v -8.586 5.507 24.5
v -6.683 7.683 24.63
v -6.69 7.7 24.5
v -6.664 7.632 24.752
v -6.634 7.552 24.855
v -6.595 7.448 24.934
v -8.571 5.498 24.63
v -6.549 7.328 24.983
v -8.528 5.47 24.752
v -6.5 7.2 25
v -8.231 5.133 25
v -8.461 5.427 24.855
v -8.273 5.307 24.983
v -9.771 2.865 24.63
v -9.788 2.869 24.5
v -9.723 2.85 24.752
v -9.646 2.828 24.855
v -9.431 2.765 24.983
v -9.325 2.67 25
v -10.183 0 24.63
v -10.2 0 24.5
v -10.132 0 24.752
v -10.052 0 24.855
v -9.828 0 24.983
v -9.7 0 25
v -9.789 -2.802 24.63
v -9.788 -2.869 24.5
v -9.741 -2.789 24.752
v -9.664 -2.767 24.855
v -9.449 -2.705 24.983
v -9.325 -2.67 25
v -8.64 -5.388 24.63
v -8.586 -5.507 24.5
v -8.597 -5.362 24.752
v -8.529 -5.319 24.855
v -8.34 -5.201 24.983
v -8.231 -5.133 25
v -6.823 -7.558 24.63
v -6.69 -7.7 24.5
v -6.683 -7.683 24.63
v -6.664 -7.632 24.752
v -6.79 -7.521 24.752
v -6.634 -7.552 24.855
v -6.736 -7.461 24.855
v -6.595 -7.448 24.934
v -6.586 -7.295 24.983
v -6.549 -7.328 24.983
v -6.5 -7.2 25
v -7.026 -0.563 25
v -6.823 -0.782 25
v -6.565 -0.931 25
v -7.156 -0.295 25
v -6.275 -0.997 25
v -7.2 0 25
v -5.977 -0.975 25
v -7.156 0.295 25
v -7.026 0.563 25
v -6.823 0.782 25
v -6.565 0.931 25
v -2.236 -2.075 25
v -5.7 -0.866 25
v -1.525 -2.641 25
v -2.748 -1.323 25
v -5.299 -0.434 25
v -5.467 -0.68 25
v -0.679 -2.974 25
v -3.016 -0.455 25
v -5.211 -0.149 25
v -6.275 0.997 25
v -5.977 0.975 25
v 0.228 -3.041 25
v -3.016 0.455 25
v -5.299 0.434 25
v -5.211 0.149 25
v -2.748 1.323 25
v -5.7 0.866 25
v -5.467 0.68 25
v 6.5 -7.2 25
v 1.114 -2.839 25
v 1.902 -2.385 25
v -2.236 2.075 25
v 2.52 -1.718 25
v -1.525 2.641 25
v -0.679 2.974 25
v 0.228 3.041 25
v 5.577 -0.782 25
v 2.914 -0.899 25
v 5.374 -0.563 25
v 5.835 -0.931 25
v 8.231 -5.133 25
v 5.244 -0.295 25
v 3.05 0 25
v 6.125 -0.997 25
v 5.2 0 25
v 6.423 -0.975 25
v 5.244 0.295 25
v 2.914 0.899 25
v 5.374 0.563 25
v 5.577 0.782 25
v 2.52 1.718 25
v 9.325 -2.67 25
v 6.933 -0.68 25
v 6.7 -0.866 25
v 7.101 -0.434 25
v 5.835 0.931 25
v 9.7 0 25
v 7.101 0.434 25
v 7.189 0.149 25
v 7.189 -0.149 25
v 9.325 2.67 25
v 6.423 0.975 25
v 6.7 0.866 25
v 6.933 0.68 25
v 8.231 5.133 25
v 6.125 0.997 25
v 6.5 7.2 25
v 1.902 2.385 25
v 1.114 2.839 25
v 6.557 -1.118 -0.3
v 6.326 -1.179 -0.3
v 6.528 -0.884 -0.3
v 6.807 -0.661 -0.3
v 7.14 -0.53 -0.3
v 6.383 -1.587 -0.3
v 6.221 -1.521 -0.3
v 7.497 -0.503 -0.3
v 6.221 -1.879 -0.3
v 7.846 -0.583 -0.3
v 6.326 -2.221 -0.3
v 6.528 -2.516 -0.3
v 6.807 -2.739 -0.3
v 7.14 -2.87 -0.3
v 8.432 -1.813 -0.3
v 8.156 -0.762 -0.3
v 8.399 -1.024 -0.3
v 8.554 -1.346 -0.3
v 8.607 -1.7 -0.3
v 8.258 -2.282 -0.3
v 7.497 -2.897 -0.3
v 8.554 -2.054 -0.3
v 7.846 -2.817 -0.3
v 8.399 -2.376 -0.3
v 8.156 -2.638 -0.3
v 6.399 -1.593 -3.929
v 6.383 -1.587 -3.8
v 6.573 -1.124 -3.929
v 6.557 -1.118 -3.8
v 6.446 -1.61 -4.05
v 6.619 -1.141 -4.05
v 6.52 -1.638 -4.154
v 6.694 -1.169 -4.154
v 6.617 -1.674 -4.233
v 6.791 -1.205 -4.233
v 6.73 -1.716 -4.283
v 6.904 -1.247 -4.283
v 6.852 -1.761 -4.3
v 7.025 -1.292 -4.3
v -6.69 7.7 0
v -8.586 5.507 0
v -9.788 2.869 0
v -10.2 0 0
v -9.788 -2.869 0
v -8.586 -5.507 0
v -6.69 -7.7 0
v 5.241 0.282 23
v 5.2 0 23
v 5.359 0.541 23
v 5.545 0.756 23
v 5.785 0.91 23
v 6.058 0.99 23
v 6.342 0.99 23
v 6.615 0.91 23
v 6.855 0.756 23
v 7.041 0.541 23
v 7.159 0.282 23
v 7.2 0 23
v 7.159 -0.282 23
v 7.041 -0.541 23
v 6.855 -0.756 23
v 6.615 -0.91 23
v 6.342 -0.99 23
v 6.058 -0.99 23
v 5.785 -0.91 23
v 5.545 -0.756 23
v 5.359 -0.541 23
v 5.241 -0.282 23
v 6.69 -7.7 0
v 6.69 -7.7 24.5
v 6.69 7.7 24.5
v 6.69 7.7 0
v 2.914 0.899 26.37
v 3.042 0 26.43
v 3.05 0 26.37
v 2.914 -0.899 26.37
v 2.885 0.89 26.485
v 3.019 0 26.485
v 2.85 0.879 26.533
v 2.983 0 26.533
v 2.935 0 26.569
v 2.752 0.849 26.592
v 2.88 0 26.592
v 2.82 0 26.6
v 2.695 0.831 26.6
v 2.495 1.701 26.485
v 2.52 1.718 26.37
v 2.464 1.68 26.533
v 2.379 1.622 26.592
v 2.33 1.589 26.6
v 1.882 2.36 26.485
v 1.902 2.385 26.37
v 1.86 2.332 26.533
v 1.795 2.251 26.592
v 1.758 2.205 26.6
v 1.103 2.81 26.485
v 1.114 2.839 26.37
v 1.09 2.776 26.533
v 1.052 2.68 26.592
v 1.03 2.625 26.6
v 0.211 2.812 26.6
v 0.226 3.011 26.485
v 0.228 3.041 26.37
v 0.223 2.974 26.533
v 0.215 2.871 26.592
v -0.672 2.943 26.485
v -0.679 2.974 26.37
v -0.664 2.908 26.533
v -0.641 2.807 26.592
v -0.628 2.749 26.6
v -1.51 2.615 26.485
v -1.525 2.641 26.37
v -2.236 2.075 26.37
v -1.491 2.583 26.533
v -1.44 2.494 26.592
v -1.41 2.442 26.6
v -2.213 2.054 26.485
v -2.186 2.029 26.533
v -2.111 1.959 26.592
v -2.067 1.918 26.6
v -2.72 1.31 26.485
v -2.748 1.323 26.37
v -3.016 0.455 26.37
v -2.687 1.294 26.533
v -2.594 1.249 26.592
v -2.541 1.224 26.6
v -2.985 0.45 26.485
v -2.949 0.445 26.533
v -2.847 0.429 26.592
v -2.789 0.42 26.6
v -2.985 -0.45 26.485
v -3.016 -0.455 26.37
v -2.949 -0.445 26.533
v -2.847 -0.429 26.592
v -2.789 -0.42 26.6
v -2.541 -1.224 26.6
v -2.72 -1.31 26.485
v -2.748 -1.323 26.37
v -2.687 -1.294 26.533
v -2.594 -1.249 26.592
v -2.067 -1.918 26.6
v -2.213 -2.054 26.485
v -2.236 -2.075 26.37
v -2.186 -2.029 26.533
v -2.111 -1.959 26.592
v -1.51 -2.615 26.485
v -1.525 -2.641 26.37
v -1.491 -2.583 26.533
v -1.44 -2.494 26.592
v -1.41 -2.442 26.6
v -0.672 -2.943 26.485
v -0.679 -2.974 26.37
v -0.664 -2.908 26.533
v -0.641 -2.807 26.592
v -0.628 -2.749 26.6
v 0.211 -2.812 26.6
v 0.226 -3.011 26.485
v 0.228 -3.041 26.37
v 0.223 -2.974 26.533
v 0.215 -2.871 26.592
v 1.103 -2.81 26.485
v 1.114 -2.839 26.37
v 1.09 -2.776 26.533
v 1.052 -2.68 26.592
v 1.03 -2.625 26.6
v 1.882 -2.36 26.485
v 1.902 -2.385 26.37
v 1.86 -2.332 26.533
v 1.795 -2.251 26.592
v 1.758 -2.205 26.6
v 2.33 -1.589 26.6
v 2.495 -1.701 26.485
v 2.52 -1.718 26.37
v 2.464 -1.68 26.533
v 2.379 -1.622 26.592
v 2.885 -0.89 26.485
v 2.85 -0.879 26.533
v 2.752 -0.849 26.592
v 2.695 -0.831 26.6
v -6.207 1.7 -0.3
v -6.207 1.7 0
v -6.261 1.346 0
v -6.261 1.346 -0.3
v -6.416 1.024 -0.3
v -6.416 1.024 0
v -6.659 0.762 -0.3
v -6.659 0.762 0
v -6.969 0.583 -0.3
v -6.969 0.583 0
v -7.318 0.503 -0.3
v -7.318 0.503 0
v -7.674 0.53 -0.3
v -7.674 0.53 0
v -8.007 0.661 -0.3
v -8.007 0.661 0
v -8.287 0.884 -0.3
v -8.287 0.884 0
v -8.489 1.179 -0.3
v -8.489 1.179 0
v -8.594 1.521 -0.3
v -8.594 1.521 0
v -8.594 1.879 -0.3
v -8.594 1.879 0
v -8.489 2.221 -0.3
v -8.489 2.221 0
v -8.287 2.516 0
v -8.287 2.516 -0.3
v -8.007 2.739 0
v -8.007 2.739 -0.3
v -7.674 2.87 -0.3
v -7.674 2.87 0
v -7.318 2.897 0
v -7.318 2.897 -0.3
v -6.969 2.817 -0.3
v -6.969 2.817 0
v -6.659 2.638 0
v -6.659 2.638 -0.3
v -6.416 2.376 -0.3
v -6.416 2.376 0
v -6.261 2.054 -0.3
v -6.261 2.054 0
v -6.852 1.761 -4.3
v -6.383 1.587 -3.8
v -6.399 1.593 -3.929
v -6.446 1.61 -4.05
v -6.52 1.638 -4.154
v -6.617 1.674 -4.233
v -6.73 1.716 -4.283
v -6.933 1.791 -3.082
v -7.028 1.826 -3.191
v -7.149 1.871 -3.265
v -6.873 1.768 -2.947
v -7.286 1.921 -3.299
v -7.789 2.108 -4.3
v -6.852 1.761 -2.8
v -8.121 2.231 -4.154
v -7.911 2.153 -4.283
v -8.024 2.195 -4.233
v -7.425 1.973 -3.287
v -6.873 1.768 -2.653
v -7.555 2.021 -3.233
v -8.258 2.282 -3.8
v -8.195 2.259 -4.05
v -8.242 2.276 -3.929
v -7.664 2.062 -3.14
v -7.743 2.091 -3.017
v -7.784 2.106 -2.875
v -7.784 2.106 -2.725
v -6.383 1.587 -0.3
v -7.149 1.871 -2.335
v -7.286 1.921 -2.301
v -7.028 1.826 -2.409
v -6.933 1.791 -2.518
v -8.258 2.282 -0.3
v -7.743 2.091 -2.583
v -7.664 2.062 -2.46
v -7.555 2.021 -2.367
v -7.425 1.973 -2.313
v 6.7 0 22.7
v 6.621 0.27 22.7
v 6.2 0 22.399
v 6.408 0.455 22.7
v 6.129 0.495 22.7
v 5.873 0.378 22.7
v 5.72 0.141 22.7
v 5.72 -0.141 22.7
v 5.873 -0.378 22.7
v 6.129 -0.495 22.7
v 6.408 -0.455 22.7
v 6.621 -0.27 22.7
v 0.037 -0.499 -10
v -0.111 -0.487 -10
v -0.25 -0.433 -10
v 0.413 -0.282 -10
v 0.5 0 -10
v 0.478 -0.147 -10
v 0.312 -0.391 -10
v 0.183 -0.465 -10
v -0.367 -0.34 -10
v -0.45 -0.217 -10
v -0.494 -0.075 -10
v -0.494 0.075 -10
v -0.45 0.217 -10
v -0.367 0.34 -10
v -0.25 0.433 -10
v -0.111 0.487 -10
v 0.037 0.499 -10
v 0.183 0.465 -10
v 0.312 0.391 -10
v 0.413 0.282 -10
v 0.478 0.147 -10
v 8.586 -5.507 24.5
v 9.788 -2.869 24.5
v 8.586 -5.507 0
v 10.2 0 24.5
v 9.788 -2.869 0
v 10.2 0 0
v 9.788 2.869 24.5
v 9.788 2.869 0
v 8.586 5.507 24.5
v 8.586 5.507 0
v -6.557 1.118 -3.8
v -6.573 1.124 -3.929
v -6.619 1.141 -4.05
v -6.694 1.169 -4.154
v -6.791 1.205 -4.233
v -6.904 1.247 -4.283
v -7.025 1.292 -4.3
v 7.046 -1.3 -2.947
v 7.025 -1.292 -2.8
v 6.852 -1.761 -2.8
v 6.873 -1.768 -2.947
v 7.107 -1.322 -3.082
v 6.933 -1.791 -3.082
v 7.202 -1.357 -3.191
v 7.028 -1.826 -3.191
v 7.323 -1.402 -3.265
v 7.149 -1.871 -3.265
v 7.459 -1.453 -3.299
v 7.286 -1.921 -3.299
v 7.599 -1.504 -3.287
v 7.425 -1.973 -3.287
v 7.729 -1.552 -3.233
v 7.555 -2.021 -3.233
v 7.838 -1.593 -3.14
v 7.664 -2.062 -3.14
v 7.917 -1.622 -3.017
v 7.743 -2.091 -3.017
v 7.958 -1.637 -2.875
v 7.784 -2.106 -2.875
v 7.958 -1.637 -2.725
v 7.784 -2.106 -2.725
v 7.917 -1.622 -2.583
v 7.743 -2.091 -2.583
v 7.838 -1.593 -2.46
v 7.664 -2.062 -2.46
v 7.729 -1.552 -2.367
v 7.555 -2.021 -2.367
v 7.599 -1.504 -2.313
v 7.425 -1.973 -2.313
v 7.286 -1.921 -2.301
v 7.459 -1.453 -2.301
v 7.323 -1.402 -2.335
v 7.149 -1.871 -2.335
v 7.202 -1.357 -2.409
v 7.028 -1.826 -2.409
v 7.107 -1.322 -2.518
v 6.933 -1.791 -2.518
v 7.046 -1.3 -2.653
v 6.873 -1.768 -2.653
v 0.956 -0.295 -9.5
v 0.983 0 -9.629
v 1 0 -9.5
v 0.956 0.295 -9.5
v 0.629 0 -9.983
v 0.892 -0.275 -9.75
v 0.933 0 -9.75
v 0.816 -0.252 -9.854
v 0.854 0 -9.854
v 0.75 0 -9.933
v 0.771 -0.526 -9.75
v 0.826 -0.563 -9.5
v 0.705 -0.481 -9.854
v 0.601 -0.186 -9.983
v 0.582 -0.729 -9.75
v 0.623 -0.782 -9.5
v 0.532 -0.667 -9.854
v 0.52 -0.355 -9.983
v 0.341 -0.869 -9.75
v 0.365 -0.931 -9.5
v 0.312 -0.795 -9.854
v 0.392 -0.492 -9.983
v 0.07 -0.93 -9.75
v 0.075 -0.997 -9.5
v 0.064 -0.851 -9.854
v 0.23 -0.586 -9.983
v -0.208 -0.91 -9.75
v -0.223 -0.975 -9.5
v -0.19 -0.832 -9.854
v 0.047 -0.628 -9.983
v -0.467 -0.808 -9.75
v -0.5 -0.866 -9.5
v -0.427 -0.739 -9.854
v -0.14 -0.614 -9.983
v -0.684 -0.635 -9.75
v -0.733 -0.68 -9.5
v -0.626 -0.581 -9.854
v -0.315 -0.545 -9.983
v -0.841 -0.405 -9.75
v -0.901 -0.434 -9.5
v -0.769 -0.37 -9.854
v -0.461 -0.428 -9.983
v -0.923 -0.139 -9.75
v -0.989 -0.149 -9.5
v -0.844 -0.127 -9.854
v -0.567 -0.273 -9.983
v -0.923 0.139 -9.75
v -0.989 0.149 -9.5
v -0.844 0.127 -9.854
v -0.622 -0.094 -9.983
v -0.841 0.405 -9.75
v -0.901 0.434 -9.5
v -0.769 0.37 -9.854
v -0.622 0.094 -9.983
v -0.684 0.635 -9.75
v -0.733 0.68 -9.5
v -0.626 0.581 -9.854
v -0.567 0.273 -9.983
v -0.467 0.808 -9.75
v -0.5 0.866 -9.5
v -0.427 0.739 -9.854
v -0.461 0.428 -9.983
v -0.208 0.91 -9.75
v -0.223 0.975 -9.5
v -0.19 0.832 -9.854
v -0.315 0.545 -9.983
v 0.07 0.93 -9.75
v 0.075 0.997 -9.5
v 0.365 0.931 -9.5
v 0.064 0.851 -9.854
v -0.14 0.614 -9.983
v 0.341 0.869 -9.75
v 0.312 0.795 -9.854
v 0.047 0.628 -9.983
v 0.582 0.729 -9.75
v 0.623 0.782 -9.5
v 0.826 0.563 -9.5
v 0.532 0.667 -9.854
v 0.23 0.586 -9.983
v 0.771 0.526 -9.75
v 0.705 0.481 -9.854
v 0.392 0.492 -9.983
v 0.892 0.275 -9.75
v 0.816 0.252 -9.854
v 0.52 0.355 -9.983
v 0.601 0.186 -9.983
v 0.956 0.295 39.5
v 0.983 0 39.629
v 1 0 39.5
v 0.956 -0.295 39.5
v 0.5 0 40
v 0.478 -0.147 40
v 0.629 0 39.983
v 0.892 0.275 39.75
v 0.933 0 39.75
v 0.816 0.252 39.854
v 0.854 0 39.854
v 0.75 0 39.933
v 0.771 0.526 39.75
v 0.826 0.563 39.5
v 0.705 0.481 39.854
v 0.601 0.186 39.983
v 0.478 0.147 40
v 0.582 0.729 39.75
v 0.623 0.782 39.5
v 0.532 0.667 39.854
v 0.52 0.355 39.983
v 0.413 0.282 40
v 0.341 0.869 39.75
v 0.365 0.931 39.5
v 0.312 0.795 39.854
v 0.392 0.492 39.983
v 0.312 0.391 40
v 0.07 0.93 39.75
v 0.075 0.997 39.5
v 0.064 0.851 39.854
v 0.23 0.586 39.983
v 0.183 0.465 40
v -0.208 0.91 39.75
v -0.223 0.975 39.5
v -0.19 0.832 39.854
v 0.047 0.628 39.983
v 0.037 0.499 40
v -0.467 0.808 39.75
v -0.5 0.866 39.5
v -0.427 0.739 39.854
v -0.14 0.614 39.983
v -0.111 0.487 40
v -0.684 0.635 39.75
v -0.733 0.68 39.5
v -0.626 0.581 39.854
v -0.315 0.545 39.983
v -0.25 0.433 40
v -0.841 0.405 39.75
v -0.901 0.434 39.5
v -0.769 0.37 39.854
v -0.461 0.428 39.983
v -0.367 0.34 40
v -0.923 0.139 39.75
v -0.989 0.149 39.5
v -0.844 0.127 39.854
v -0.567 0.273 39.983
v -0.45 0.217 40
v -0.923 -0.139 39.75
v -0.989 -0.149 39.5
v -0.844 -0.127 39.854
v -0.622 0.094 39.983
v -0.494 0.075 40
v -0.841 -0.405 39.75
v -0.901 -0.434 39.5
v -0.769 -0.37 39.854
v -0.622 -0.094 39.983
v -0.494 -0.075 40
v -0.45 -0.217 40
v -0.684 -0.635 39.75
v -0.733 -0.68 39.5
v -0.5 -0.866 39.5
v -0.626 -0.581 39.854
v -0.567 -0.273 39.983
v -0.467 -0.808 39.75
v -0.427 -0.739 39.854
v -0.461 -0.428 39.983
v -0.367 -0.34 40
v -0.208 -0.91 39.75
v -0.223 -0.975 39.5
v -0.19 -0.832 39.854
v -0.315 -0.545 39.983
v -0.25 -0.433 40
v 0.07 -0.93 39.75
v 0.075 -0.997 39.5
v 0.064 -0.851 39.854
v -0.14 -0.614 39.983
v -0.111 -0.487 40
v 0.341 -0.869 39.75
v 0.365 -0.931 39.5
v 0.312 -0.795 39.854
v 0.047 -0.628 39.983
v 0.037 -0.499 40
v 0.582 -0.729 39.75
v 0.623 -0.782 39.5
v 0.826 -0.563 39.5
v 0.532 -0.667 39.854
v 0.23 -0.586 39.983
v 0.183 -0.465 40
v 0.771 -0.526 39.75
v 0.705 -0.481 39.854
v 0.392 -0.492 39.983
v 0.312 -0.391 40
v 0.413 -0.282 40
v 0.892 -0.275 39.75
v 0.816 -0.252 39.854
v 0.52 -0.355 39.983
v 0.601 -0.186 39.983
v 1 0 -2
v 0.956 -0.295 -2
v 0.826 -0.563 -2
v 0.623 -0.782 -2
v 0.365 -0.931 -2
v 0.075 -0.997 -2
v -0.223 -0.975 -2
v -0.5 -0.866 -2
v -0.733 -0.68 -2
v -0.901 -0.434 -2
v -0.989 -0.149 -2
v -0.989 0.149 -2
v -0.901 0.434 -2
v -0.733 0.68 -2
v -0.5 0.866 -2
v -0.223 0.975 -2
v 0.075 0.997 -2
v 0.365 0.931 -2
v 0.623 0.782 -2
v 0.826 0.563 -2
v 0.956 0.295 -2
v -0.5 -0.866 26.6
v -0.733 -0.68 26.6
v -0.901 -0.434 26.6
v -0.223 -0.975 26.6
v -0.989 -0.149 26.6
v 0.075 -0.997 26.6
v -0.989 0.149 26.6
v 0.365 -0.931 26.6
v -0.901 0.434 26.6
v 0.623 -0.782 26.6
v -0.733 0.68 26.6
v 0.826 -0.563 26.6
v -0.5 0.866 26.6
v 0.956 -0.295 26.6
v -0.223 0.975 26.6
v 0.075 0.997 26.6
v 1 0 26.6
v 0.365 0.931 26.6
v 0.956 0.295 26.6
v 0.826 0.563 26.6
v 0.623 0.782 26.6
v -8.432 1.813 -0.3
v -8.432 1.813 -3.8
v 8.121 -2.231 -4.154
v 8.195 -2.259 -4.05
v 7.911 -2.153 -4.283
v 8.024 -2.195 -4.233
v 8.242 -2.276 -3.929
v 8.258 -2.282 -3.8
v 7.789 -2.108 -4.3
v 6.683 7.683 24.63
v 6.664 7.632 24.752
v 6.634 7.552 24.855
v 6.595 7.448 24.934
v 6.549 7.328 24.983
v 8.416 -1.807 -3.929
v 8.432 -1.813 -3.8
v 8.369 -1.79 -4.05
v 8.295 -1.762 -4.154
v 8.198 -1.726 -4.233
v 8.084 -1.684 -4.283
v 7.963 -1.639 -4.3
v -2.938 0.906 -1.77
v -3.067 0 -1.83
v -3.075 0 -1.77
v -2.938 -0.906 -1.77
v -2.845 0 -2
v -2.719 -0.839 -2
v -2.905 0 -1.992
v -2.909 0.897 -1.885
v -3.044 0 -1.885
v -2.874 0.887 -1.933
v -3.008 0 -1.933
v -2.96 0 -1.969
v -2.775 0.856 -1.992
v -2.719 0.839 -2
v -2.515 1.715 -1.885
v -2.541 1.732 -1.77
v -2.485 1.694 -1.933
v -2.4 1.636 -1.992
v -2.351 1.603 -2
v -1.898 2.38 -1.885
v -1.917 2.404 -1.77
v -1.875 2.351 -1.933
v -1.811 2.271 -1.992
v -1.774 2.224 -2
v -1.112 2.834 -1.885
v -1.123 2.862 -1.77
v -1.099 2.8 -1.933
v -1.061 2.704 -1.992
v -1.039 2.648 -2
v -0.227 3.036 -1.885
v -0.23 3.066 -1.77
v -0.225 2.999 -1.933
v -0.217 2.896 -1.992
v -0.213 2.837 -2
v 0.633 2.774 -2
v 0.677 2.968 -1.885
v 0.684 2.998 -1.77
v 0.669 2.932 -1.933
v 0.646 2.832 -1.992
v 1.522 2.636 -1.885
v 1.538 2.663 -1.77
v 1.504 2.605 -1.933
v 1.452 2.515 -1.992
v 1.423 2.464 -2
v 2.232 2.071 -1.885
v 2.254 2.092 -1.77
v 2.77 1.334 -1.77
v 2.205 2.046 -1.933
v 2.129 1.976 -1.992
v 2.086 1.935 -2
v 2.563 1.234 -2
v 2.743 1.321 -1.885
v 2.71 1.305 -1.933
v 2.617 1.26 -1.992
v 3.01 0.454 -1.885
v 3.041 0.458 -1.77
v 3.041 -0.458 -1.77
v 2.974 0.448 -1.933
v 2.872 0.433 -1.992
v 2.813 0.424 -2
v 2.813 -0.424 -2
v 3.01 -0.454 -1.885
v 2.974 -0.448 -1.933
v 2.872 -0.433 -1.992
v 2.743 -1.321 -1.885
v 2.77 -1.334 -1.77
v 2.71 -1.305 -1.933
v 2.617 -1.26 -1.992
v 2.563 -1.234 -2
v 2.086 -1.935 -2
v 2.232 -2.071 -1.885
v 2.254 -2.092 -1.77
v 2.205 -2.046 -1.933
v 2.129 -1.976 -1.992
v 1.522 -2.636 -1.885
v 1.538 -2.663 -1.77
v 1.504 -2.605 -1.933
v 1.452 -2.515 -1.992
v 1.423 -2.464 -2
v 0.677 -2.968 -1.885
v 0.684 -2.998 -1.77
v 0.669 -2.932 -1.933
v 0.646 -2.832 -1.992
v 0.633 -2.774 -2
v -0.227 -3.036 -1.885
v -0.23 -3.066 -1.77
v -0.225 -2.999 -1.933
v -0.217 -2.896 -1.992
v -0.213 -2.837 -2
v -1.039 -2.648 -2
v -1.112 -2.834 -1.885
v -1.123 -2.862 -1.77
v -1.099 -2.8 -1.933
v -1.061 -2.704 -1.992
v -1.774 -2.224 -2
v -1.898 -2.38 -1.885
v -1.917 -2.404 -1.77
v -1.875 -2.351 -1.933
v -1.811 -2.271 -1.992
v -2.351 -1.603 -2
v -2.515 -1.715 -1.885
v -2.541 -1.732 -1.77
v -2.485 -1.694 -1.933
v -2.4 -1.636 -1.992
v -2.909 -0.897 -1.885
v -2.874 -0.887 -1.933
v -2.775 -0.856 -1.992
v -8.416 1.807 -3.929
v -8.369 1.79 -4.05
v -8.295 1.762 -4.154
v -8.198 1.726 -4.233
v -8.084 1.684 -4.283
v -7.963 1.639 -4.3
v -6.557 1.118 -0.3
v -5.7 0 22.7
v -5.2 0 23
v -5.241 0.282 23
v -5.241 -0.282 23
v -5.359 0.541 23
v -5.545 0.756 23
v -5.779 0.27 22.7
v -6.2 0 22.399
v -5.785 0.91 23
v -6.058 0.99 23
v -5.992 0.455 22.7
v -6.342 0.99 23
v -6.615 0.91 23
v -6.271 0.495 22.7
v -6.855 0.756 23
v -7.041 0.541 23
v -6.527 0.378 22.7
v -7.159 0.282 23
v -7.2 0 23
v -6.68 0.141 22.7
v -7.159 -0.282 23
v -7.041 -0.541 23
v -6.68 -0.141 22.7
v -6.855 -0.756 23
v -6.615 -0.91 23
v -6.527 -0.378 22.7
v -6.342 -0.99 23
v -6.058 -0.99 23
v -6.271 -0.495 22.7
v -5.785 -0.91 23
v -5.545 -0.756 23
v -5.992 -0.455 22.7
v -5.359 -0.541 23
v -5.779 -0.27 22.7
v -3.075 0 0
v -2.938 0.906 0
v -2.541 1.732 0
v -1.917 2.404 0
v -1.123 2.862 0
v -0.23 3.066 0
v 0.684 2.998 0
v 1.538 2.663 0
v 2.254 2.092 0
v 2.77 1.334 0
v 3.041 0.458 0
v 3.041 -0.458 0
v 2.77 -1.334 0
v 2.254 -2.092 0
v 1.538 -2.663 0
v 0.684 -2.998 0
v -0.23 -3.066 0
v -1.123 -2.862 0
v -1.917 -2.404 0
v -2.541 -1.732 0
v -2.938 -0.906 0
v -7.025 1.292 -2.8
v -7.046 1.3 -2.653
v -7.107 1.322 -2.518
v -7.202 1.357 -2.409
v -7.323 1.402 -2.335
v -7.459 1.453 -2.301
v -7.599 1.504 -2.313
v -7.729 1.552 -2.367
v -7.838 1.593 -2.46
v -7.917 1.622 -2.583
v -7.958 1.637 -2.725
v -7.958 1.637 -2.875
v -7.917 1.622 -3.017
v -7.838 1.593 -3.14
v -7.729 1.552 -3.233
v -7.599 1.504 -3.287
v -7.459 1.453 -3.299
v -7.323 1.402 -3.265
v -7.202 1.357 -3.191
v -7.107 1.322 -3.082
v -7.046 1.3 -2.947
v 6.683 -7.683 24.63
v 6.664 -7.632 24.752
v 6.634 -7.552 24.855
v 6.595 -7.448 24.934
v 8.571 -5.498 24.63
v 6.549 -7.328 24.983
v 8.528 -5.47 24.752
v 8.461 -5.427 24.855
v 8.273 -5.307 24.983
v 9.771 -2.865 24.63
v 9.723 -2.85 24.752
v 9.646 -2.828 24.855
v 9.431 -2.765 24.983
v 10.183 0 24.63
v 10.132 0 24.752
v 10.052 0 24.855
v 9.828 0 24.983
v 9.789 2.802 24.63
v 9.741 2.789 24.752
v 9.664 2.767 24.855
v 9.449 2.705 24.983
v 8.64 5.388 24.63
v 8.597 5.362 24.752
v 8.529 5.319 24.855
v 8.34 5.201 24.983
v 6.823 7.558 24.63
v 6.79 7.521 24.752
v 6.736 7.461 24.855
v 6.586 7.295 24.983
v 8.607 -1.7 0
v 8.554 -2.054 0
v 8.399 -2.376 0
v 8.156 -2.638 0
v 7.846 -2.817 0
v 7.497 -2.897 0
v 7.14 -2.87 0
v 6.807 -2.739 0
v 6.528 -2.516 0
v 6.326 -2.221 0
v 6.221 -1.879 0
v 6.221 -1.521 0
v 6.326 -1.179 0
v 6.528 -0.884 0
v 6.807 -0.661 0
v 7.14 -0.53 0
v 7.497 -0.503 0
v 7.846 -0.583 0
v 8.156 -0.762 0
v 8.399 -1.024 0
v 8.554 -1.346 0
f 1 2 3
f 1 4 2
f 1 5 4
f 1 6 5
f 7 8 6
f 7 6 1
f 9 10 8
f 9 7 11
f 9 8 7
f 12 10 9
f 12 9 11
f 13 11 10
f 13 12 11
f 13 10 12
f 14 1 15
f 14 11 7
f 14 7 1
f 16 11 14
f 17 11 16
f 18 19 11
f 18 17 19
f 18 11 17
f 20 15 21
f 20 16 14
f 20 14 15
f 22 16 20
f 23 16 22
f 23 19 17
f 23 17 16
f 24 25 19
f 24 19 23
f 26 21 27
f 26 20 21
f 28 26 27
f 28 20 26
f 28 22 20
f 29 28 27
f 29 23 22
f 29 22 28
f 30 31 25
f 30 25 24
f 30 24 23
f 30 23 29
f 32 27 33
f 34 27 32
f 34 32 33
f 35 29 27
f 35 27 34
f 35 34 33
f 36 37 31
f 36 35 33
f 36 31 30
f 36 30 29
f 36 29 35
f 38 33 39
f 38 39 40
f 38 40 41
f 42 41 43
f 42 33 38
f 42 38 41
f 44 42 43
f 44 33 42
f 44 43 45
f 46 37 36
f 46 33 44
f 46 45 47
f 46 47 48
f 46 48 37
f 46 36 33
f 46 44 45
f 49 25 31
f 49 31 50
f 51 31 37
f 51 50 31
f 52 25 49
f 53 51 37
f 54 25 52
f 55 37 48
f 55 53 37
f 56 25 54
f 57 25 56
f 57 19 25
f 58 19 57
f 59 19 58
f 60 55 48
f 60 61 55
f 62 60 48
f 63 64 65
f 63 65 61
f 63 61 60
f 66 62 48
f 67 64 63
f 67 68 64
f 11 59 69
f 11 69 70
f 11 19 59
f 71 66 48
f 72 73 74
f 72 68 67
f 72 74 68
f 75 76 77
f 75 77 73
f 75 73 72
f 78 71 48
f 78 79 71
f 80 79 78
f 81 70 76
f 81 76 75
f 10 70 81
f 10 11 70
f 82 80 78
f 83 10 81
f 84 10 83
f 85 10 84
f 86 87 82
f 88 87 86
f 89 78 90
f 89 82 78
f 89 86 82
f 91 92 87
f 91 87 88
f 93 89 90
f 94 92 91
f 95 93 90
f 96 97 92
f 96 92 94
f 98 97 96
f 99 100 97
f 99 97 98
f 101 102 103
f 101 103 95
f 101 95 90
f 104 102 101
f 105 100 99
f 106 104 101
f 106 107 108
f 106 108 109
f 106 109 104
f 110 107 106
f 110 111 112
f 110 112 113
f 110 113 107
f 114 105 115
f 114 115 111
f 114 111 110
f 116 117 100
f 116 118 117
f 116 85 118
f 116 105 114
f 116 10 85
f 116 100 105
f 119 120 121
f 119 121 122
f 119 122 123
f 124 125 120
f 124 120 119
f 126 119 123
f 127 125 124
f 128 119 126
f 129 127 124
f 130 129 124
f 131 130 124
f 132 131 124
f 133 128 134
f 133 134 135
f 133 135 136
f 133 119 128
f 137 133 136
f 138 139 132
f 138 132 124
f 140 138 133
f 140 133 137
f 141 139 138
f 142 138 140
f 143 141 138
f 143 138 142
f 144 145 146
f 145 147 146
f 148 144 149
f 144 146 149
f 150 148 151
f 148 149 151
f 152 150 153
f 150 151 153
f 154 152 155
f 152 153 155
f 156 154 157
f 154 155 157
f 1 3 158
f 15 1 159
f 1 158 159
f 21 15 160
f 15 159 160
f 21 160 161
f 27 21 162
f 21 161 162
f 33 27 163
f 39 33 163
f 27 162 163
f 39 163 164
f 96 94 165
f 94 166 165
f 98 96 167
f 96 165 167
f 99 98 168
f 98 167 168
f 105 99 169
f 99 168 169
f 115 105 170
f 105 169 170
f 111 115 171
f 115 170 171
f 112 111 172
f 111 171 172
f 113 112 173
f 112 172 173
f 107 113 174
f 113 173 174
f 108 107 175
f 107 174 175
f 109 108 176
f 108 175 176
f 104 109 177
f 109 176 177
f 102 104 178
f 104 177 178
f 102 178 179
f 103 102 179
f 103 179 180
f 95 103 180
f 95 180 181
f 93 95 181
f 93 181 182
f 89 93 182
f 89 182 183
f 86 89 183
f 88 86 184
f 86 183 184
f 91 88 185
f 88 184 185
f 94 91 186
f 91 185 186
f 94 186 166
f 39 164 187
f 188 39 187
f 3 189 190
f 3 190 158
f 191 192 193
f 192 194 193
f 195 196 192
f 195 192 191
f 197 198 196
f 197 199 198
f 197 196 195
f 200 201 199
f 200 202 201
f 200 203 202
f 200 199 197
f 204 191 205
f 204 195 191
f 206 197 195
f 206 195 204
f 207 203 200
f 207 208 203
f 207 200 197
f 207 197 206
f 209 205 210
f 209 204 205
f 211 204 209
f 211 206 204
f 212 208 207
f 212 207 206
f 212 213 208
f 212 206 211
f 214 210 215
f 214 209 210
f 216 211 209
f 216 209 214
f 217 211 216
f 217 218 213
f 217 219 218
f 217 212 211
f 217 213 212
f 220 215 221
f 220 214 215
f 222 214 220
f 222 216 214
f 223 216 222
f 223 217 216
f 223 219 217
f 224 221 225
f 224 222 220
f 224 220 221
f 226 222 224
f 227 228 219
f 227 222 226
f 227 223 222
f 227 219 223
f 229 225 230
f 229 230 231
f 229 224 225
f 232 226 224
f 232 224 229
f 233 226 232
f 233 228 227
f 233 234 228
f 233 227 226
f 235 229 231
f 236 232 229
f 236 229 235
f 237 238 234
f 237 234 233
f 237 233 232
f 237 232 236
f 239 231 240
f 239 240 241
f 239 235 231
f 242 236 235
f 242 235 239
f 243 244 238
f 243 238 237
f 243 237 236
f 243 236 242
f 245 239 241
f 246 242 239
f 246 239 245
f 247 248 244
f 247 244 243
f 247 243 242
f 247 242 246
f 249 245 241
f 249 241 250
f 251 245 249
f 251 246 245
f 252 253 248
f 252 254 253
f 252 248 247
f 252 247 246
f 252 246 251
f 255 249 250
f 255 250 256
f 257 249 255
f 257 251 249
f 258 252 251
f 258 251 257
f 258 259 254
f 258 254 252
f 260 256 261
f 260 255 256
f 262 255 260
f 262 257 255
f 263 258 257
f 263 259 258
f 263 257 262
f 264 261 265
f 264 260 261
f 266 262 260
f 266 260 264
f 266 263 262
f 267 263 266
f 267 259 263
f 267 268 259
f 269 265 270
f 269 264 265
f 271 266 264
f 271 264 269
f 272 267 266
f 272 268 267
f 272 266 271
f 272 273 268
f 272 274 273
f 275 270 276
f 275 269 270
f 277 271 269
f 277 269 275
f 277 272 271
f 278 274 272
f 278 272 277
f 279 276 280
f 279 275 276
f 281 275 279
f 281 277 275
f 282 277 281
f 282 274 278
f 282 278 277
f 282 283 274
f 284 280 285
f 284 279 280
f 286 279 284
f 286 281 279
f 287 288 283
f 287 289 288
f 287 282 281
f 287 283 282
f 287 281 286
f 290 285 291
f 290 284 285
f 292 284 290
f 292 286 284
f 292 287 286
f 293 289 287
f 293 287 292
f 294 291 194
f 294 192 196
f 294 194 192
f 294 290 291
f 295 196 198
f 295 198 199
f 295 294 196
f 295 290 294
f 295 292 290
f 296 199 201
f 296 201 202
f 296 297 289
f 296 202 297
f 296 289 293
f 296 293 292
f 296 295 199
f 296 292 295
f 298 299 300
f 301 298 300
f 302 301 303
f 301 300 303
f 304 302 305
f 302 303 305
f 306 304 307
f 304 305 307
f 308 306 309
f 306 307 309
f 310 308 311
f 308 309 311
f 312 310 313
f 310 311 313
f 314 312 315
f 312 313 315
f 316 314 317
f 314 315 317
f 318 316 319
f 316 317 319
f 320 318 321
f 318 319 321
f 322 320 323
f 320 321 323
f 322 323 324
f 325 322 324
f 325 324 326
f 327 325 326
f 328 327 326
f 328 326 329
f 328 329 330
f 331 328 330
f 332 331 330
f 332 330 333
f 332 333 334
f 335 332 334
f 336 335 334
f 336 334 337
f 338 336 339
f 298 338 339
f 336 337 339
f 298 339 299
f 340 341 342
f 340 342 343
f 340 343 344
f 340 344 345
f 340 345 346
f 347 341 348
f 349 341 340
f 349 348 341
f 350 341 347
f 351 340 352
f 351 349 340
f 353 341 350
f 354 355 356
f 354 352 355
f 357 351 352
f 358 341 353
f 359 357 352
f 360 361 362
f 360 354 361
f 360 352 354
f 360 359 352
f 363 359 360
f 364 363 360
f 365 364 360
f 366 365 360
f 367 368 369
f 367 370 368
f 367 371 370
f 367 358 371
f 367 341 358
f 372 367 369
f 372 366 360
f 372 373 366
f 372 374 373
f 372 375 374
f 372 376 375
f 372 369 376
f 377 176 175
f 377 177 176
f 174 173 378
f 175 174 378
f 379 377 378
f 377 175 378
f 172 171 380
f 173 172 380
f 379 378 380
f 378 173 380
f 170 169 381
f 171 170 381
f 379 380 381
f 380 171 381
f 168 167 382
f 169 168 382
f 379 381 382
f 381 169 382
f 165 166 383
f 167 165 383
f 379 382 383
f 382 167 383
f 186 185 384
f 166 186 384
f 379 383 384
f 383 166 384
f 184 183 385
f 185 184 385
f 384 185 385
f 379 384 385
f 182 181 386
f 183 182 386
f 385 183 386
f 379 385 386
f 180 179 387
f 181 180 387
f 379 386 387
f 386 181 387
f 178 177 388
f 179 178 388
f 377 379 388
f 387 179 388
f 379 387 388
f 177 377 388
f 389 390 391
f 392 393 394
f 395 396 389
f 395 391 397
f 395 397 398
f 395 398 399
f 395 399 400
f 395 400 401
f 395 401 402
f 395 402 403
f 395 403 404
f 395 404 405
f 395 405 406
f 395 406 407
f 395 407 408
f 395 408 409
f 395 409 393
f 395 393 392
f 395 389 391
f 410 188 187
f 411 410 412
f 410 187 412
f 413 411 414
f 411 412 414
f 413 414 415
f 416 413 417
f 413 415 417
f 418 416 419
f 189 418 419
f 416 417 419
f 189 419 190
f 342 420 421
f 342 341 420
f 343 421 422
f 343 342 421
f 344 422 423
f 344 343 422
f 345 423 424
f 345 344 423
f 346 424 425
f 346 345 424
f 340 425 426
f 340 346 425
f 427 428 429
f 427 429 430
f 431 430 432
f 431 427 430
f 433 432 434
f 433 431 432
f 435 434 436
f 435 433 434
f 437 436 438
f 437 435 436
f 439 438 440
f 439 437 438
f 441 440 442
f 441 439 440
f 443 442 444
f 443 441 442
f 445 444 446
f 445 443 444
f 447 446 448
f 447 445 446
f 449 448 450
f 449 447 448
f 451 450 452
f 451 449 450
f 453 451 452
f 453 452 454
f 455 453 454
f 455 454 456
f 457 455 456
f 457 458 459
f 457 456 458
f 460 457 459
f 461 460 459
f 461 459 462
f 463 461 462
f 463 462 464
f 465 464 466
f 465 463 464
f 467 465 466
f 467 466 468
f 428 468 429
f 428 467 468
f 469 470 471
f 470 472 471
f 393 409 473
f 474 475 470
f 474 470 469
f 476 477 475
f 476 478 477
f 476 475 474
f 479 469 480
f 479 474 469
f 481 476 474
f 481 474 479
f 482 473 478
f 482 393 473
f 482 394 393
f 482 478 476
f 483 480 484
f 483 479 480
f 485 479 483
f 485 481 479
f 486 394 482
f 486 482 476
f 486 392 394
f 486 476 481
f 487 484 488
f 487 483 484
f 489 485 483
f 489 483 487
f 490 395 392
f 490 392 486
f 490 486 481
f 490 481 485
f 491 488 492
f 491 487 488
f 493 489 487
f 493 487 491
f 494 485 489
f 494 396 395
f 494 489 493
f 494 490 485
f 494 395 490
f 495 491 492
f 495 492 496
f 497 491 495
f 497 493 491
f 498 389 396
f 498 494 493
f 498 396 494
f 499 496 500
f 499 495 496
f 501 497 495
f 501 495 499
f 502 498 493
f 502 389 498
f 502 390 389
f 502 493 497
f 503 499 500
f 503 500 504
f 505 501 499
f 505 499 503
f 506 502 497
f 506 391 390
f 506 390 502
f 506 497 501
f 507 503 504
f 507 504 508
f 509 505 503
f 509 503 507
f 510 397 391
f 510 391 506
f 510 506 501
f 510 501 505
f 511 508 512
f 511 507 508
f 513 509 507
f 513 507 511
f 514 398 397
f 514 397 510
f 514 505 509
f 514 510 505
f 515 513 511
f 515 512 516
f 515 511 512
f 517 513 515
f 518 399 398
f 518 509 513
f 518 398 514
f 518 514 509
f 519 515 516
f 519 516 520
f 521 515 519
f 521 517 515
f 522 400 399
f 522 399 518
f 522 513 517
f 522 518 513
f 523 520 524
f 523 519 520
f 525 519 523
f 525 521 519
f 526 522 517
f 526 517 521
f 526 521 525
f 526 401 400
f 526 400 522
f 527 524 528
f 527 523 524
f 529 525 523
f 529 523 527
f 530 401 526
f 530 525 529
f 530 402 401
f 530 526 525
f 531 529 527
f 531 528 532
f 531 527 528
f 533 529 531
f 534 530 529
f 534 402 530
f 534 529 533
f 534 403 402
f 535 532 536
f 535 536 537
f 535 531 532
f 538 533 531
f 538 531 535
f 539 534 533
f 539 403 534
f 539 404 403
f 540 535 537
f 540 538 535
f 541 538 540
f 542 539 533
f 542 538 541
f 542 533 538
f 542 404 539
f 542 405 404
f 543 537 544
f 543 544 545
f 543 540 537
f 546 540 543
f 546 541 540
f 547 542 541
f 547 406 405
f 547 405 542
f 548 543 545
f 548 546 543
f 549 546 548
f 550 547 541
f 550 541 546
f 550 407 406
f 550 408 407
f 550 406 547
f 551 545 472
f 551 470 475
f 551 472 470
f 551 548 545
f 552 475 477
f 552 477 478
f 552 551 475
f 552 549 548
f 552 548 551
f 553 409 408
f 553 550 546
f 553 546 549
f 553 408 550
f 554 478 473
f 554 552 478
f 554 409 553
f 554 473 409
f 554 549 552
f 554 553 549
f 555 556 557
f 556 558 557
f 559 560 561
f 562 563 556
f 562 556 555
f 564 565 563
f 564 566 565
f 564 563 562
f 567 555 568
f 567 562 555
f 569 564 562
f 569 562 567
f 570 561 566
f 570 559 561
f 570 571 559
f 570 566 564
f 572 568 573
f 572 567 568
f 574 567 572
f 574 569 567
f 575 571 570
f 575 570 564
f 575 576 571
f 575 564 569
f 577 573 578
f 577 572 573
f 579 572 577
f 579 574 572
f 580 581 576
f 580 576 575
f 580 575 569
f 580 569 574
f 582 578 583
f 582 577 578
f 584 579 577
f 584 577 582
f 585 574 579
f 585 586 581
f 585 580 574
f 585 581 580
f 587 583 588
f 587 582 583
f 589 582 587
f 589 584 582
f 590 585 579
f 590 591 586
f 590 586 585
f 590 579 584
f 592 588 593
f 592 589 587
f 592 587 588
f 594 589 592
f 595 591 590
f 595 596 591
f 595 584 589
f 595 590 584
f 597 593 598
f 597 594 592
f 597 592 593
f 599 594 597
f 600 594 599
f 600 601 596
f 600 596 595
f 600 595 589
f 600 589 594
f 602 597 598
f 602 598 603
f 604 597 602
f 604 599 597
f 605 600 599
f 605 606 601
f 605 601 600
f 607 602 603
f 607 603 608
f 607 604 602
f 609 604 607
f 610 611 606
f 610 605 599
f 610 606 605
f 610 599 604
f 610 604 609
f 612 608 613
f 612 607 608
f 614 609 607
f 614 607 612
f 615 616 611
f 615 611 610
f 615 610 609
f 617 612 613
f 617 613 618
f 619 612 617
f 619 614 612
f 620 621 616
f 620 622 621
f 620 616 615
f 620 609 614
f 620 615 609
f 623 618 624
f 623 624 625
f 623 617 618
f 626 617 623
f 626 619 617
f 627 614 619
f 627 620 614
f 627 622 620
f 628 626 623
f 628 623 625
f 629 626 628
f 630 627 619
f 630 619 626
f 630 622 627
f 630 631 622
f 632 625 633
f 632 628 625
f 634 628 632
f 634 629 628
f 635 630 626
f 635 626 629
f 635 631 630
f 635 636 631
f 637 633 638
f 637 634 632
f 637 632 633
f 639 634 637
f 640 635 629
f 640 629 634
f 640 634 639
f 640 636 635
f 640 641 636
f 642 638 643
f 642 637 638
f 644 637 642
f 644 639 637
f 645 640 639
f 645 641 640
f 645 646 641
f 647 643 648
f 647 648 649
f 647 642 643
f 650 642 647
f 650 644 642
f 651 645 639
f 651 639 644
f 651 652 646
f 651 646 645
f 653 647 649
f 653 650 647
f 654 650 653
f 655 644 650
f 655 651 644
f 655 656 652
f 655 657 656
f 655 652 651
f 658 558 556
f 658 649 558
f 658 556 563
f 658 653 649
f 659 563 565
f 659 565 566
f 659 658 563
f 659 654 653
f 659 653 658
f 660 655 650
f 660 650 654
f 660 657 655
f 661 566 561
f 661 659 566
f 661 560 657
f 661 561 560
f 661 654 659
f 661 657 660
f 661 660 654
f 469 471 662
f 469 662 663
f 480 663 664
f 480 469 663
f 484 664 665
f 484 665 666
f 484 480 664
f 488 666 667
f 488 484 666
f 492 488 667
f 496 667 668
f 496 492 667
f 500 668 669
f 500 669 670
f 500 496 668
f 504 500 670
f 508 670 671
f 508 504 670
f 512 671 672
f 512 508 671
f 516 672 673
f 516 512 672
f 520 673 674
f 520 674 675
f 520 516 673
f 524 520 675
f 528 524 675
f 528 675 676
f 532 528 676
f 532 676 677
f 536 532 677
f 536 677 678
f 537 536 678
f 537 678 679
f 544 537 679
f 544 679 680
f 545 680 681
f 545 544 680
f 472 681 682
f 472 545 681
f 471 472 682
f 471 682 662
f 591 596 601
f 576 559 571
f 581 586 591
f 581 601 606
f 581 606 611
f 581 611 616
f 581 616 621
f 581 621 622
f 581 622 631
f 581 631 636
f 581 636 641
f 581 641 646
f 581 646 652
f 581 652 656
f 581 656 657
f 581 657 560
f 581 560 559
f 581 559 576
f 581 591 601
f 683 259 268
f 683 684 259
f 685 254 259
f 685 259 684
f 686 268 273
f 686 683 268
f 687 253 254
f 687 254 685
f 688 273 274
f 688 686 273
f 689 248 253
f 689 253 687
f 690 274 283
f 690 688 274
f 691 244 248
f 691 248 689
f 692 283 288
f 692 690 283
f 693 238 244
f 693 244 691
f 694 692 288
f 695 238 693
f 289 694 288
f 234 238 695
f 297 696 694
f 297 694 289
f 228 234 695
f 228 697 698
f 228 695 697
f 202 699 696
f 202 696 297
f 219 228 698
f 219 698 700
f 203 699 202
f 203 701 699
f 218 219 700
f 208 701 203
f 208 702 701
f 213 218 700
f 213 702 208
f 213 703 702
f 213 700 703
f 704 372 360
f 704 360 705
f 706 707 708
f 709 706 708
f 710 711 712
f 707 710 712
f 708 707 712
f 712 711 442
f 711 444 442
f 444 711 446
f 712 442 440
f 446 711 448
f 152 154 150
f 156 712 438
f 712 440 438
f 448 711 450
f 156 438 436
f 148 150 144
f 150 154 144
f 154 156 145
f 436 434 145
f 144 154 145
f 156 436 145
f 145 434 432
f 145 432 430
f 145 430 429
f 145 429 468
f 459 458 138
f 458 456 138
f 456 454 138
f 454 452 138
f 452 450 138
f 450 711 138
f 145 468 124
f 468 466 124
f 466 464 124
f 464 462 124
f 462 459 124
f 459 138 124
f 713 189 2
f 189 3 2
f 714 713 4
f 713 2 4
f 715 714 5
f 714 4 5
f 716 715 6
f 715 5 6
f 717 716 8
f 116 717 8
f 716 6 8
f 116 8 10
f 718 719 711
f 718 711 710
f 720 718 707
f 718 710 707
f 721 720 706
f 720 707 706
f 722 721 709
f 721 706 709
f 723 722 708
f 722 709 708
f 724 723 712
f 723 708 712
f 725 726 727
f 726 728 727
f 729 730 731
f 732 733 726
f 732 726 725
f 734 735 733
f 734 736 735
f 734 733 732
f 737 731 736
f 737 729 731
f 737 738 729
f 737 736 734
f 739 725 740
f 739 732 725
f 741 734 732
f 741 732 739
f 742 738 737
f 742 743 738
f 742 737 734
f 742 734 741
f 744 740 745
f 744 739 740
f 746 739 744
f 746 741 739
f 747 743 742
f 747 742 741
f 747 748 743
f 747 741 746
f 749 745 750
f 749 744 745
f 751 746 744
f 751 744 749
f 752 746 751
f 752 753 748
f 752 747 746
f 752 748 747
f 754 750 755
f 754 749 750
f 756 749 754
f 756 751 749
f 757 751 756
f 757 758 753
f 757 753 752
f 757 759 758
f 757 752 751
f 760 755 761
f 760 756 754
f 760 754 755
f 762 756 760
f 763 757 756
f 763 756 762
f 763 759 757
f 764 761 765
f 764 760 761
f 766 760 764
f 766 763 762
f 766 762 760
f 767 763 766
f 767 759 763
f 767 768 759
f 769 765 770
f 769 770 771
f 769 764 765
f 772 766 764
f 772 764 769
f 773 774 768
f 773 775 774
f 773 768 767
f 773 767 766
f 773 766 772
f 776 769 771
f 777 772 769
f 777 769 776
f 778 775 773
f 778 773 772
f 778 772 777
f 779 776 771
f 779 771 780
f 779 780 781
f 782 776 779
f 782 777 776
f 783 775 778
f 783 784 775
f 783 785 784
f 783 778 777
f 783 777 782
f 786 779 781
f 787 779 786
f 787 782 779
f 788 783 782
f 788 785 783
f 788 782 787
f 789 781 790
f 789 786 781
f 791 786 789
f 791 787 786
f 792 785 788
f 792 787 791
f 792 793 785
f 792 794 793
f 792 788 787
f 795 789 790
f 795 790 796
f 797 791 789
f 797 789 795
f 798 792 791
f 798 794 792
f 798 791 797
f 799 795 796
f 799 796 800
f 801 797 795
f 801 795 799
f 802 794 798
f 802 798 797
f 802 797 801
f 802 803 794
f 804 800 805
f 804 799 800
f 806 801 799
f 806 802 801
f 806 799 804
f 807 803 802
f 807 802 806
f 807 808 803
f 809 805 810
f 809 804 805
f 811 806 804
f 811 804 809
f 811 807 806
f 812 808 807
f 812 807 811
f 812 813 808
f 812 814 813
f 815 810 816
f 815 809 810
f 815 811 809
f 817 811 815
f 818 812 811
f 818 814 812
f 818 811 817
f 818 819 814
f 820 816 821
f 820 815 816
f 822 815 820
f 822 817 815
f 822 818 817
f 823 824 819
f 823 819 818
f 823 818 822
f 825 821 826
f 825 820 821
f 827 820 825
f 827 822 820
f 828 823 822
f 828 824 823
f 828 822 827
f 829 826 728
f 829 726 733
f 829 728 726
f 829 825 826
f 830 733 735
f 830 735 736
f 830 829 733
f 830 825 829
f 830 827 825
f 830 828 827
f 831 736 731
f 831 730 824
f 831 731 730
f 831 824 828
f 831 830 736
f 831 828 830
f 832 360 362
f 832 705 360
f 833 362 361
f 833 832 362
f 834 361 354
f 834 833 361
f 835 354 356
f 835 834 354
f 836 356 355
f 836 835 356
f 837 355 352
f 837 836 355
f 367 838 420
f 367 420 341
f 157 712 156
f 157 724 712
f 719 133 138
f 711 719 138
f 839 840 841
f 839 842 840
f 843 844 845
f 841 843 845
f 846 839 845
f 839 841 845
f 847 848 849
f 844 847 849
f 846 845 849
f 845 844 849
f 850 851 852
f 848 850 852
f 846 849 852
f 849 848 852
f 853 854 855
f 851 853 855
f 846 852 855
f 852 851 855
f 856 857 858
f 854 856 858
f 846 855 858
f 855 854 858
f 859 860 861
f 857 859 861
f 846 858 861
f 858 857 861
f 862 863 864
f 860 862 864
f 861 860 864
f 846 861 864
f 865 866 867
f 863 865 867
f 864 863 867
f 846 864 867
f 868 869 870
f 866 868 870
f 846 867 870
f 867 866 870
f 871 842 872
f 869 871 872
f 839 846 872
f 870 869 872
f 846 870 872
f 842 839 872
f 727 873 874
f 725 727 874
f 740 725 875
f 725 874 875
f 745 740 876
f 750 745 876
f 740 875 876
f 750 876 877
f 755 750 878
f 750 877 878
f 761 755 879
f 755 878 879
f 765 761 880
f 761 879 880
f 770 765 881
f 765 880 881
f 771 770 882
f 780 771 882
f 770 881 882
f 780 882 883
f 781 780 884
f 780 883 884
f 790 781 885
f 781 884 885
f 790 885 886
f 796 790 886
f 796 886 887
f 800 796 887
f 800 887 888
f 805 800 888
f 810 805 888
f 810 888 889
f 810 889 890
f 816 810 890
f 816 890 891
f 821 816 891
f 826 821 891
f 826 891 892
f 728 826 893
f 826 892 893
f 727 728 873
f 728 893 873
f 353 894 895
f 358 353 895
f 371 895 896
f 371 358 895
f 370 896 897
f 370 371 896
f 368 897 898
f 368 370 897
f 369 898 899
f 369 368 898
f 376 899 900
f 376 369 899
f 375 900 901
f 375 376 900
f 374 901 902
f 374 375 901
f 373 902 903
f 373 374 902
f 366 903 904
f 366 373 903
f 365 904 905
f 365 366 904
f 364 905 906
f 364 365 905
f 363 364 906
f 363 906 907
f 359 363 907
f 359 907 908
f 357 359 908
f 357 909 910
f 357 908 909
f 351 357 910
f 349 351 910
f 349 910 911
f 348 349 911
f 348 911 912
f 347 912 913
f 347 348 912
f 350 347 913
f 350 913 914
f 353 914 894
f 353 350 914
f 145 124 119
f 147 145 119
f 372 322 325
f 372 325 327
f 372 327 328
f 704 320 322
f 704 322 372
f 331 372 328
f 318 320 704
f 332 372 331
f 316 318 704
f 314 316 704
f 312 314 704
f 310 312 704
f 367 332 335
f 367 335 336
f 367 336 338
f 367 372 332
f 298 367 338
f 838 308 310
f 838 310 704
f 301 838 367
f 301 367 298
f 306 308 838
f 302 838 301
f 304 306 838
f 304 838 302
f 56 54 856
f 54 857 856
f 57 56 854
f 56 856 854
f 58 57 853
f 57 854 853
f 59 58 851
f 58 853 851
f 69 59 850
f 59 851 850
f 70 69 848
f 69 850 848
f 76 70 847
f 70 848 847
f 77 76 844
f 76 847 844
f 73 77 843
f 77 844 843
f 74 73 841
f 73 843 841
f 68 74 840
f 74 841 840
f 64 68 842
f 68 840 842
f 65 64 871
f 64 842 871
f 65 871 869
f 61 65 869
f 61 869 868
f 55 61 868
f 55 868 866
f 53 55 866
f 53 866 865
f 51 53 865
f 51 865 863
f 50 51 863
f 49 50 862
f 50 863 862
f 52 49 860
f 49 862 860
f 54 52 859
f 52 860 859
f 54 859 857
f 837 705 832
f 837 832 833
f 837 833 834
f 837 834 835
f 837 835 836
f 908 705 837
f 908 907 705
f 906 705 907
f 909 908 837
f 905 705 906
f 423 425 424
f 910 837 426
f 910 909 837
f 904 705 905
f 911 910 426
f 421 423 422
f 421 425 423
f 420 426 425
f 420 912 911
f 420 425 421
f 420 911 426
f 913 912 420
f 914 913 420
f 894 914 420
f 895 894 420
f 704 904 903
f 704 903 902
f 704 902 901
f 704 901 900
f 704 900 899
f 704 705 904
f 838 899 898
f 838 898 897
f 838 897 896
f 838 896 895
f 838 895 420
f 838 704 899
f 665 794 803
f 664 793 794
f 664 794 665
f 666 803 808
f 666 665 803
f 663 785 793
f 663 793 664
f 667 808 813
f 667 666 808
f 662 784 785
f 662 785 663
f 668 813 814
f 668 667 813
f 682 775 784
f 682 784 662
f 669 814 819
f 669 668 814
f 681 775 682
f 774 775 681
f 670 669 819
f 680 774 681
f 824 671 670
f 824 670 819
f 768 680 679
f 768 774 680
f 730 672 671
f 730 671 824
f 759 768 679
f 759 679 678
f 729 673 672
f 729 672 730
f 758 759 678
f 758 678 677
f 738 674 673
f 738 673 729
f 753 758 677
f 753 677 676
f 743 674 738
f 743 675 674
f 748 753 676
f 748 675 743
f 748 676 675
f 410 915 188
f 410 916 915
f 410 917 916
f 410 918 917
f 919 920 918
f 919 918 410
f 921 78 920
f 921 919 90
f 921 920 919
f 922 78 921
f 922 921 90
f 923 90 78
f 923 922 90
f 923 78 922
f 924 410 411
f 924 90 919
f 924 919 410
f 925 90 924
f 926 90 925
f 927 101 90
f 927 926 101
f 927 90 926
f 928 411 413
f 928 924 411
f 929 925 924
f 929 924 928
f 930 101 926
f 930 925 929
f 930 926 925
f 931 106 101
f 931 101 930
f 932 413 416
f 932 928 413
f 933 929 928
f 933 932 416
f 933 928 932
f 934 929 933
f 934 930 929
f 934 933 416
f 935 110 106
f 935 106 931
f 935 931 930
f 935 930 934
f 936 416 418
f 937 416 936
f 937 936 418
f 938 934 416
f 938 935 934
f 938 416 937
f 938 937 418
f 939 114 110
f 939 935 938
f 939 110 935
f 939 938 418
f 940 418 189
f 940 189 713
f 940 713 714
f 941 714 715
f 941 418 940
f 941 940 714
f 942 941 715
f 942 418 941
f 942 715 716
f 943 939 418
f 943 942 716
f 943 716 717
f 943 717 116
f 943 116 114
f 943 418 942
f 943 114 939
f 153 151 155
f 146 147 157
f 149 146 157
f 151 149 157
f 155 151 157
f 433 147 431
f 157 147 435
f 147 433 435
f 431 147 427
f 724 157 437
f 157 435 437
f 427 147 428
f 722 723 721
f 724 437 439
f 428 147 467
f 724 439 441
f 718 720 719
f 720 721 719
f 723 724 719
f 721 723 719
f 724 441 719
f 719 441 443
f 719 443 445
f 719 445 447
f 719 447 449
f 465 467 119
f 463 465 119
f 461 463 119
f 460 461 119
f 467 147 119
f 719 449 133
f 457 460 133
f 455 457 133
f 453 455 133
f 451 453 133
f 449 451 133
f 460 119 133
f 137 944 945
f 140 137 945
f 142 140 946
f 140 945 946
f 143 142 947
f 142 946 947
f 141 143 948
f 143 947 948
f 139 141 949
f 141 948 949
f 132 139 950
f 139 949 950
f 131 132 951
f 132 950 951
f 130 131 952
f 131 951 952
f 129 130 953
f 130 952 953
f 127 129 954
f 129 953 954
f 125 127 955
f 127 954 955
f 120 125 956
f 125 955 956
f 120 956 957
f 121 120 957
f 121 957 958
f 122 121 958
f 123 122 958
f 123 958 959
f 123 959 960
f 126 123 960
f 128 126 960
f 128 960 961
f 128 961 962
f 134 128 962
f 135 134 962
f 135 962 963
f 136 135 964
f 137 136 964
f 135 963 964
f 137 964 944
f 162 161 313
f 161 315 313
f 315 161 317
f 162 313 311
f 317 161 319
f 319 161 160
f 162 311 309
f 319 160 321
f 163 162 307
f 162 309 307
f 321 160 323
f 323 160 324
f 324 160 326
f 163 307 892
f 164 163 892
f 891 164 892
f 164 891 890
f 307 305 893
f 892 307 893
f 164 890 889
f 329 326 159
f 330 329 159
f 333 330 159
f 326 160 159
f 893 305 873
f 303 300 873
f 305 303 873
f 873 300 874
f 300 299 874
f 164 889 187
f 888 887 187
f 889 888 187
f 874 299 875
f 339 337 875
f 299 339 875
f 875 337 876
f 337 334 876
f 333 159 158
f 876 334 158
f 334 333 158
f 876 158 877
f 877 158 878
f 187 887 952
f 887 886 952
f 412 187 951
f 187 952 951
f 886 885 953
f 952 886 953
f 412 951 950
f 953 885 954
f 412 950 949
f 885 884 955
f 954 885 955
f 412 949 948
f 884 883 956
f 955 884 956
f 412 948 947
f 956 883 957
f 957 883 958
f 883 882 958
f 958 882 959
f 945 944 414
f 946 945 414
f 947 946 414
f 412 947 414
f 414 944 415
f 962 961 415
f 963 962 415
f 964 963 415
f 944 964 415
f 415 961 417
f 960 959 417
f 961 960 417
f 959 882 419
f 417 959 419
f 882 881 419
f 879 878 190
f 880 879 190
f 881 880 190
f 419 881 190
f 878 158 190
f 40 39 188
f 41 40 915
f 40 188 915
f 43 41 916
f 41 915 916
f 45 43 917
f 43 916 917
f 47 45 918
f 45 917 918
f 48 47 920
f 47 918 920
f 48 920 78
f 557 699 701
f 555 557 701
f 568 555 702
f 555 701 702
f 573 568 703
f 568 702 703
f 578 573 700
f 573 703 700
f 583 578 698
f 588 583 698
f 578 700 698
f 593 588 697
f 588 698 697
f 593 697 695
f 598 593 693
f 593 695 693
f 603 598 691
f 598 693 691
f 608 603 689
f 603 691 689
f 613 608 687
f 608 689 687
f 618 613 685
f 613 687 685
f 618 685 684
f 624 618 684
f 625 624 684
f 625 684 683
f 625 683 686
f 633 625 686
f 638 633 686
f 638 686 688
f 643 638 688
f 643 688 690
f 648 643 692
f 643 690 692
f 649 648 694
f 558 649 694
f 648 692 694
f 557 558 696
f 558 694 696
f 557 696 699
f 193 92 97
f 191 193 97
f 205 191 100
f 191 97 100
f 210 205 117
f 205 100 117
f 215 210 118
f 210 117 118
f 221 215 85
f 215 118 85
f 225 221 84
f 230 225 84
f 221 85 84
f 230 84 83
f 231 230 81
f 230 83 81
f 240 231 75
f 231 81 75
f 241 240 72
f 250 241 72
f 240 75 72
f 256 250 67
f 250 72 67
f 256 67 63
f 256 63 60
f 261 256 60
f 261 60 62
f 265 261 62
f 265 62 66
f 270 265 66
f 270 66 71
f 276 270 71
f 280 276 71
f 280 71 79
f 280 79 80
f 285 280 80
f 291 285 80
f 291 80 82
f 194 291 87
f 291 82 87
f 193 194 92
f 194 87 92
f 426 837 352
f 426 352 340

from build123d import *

# Parameters (mm, degrees)
BOSS_EXTRUDE1_DEPTH          = 25
FILLET1_R                    = 0.5
SKETCH2_R                    = 3.05
BOSS_EXTRUDE2_DEPTH          = 1.6
SKETCH3_R                    = 1
BOSS_EXTRUDE3_DEPTH          = 13.4
SKETCH4_R                    = 3.075
BOSS_EXTRUDE4_DEPTH          = 2
FILLET2_R                    = 0.23
BOSS_EXTRUDE6_START          = 8
SKETCH5_R                    = 1
BOSS_EXTRUDE6_DEPTH          = 8
FILLET3_R                    = 0.5
BOSS_EXTRUDE7_DEPTH          = 4.3
SKETCH6_3_R                  = 1.1999999999999995
SKETCH6_3_R_2                = 1.2000000000000004
BOSS_EXTRUDE8_DEPTH          = 0.3
FILLET4_R                    = 0.5
CUT_EXTRUDE1_DEPTH           = 43.18502328832356
CUT_EXTRUDE1_DEPTH_BACK      = 43.18502328832356
SKETCH7_R                    = 0.4999999999999999
SKETCH7_R_2                  = 0.5000000000000017
F_2_0_2_DIAMETER_HOLE1_D     = 2
F_2_0_2_DIAMETER_HOLE1_DEPTH = 2
F_2_0_2_DIAMETER_HOLE1_TIP   = 0.6008606190275603


with BuildPart() as part:
    # Sketch1 → Boss-Extrude1 (new body)
    with BuildSketch(Plane.XY):
        with BuildLine():
            ThreePointArc((-6.689544080129374, 7.700000000000392), (-10.2, 1.25e-15), (-6.689544080129376, -7.70000000000039))
            Line((-6.689544080129249, -7.700000000000001), (6.689544080129178, -7.700000000000001))
            ThreePointArc((6.6895440801293145, -7.700000000000443), (9.280984581856574, -4.2312321126759915), (10.2, -2.5e-15))
            ThreePointArc((10.2, 0), (9.280984581856577, 4.231232112675986), (6.689544080129316, 7.7000000000004425))
            Line((6.689544080129178, 7.699999999999999), (-6.6895440801292505, 7.699999999999999))
        make_face()
    extrude(amount=BOSS_EXTRUDE1_DEPTH)

    # Fillet1
    fillet1_edges = [part.edges().sort_by_distance(p)[0] for p in [
        (-3.553e-14, -7.700000000000001, 25),
        (10.2, 4e-15, 25),
        (-3.642e-14, 7.699999999999999, 25),
        (-10.2, 2.44e-15, 25),
    ]]
    fillet(fillet1_edges, radius=FILLET1_R)

    # Sketch2 → Boss-Extrude2 (add)
    with BuildSketch(Plane.XY.offset(25)):
        Circle(SKETCH2_R)
    extrude(amount=BOSS_EXTRUDE2_DEPTH)

    # Sketch3 → Boss-Extrude3 (add)
    with BuildSketch(Plane.XY.offset(26.6)):
        Circle(SKETCH3_R)
    extrude(amount=BOSS_EXTRUDE3_DEPTH)

    # Sketch4 → Boss-Extrude4 (add)
    with BuildSketch(Plane(origin=(0, 0, 0), x_dir=(-1, 0, 0), z_dir=(0, 0, -1))):
        Circle(SKETCH4_R)
    extrude(amount=BOSS_EXTRUDE4_DEPTH)

    # Fillet2
    fillet2_edges = [part.edges().sort_by_distance(p)[0] for p in [
        (-3.05, 3.7e-16, 26.6),
        (3.075, -9.9e-16, -2),
    ]]
    fillet(fillet2_edges, radius=FILLET2_R)

    # Sketch5 → Boss-Extrude6 (add)
    with BuildSketch(Plane(origin=(0, 0, -2), x_dir=(-1, 0, 0), z_dir=(0, 0, -1)).offset(BOSS_EXTRUDE6_START)):
        with Locations(Location((0, 0, 0), (0, 0, 180))):
            Circle(SKETCH5_R)
    extrude(amount=-BOSS_EXTRUDE6_DEPTH)

    # Fillet3
    fillet3_edges = [part.edges().sort_by_distance(p)[0] for p in [
        (-1, 1.2e-16, 40),
        (-1, -2.4e-16, -10),
    ]]
    fillet(fillet3_edges, radius=FILLET3_R)

    # Sketch6 → Boss-Extrude7 (add)
    with BuildSketch(Plane(origin=(0, 0, 0), x_dir=(-1, 0, 0), z_dir=(0, 0, -1))):
        Polygon((-8.258245331971702, -2.2819029687246677), (-6.382871458127414, -1.5869404997364032), (-6.556612075374479, -1.118097031275331), (-8.431985949218769, -1.8130595002635959), align=None)
        Polygon((6.5566120753744785, 1.118097031275332), (6.382871458127412, 1.5869404997364045), (8.2582453319717, 2.281902968724668), (8.431985949218767, 1.8130595002635954), align=None)
    extrude(amount=BOSS_EXTRUDE7_DEPTH)

    # Sketch6<3> → Boss-Extrude8 (add)
    # profile 1 of 2: a face of its own
    with BuildSketch(Plane(origin=(0, 0, 0), x_dir=(-1, 0, 0), z_dir=(0, 0, -1))):
        with Locations(Location((-7.40742870367309, -1.7, 0), (0, 0, 180))):
            Circle(SKETCH6_3_R)
        Polygon((-6.382871458127414, -1.5869404997364032), (-6.556612075374479, -1.118097031275331), (-8.431985949218769, -1.8130595002635959), (-8.258245331971702, -2.2819029687246677), align=None, mode=Mode.SUBTRACT)
    # profile 2 of 2: a face of its own
    with BuildSketch(Plane(origin=(0, 0, 0), x_dir=(-1, 0, 0), z_dir=(0, 0, -1))):
        with Locations(Location((7.407428703673089, 1.6999999999999995, 0), (0, 0, 180))):
            Circle(SKETCH6_3_R_2)
        Polygon((8.431985949218767, 1.8130595002635954), (6.5566120753744785, 1.118097031275332), (6.382871458127412, 1.5869404997364045), (8.2582453319717, 2.281902968724668), align=None, mode=Mode.SUBTRACT)
    extrude(amount=BOSS_EXTRUDE8_DEPTH)

    # Fillet4
    fillet4_edges = [part.edges().sort_by_distance(p)[0] for p in [
        (8.345115640595235, -2.047481234494132, -4.3),
        (6.469741766750946, -1.352518765505867, -4.3),
        (-6.469741766750945, 1.3525187655058684, -4.3),
        (-8.345115640595234, 2.047481234494132, -4.3),
    ]]
    fillet(fillet4_edges, radius=FILLET4_R)

    # Sketch7 → Cut-Extrude1 (cut, two sides: drawn at the far end of the back side and taken through both)
    with BuildSketch(Plane(origin=(0.2536177540026074, 0.6843939507869876, 0), x_dir=(0.9376869369221446, -0.3474812344941323, 0), z_dir=(-0.3474812344941323, -0.9376869369221446, 0)).offset(-CUT_EXTRUDE1_DEPTH_BACK)):
        with Locations((-7.536567230256415, -2.8000000000000034)):
            Circle(SKETCH7_R)
        with Locations(Location((7.53656723025642, -2.8000000000000034, 0), (0, 0, 180))):
            Circle(SKETCH7_R_2)
    extrude(amount=CUT_EXTRUDE1_DEPTH + CUT_EXTRUDE1_DEPTH_BACK, mode=Mode.SUBTRACT)

    # Ø2.0 (2) Diameter Hole1
    with Locations(Plane.XY.offset(25)):
        with Locations((-6.2, 0), (6.2, 0)):
            Hole(F_2_0_2_DIAMETER_HOLE1_D / 2, depth=F_2_0_2_DIAMETER_HOLE1_DEPTH)
            with Locations((0, 0, -(F_2_0_2_DIAMETER_HOLE1_DEPTH + F_2_0_2_DIAMETER_HOLE1_TIP / 2))):  # 118° drill point
                Cone(0, F_2_0_2_DIAMETER_HOLE1_D / 2, F_2_0_2_DIAMETER_HOLE1_TIP, mode=Mode.SUBTRACT)


solid = part.part
